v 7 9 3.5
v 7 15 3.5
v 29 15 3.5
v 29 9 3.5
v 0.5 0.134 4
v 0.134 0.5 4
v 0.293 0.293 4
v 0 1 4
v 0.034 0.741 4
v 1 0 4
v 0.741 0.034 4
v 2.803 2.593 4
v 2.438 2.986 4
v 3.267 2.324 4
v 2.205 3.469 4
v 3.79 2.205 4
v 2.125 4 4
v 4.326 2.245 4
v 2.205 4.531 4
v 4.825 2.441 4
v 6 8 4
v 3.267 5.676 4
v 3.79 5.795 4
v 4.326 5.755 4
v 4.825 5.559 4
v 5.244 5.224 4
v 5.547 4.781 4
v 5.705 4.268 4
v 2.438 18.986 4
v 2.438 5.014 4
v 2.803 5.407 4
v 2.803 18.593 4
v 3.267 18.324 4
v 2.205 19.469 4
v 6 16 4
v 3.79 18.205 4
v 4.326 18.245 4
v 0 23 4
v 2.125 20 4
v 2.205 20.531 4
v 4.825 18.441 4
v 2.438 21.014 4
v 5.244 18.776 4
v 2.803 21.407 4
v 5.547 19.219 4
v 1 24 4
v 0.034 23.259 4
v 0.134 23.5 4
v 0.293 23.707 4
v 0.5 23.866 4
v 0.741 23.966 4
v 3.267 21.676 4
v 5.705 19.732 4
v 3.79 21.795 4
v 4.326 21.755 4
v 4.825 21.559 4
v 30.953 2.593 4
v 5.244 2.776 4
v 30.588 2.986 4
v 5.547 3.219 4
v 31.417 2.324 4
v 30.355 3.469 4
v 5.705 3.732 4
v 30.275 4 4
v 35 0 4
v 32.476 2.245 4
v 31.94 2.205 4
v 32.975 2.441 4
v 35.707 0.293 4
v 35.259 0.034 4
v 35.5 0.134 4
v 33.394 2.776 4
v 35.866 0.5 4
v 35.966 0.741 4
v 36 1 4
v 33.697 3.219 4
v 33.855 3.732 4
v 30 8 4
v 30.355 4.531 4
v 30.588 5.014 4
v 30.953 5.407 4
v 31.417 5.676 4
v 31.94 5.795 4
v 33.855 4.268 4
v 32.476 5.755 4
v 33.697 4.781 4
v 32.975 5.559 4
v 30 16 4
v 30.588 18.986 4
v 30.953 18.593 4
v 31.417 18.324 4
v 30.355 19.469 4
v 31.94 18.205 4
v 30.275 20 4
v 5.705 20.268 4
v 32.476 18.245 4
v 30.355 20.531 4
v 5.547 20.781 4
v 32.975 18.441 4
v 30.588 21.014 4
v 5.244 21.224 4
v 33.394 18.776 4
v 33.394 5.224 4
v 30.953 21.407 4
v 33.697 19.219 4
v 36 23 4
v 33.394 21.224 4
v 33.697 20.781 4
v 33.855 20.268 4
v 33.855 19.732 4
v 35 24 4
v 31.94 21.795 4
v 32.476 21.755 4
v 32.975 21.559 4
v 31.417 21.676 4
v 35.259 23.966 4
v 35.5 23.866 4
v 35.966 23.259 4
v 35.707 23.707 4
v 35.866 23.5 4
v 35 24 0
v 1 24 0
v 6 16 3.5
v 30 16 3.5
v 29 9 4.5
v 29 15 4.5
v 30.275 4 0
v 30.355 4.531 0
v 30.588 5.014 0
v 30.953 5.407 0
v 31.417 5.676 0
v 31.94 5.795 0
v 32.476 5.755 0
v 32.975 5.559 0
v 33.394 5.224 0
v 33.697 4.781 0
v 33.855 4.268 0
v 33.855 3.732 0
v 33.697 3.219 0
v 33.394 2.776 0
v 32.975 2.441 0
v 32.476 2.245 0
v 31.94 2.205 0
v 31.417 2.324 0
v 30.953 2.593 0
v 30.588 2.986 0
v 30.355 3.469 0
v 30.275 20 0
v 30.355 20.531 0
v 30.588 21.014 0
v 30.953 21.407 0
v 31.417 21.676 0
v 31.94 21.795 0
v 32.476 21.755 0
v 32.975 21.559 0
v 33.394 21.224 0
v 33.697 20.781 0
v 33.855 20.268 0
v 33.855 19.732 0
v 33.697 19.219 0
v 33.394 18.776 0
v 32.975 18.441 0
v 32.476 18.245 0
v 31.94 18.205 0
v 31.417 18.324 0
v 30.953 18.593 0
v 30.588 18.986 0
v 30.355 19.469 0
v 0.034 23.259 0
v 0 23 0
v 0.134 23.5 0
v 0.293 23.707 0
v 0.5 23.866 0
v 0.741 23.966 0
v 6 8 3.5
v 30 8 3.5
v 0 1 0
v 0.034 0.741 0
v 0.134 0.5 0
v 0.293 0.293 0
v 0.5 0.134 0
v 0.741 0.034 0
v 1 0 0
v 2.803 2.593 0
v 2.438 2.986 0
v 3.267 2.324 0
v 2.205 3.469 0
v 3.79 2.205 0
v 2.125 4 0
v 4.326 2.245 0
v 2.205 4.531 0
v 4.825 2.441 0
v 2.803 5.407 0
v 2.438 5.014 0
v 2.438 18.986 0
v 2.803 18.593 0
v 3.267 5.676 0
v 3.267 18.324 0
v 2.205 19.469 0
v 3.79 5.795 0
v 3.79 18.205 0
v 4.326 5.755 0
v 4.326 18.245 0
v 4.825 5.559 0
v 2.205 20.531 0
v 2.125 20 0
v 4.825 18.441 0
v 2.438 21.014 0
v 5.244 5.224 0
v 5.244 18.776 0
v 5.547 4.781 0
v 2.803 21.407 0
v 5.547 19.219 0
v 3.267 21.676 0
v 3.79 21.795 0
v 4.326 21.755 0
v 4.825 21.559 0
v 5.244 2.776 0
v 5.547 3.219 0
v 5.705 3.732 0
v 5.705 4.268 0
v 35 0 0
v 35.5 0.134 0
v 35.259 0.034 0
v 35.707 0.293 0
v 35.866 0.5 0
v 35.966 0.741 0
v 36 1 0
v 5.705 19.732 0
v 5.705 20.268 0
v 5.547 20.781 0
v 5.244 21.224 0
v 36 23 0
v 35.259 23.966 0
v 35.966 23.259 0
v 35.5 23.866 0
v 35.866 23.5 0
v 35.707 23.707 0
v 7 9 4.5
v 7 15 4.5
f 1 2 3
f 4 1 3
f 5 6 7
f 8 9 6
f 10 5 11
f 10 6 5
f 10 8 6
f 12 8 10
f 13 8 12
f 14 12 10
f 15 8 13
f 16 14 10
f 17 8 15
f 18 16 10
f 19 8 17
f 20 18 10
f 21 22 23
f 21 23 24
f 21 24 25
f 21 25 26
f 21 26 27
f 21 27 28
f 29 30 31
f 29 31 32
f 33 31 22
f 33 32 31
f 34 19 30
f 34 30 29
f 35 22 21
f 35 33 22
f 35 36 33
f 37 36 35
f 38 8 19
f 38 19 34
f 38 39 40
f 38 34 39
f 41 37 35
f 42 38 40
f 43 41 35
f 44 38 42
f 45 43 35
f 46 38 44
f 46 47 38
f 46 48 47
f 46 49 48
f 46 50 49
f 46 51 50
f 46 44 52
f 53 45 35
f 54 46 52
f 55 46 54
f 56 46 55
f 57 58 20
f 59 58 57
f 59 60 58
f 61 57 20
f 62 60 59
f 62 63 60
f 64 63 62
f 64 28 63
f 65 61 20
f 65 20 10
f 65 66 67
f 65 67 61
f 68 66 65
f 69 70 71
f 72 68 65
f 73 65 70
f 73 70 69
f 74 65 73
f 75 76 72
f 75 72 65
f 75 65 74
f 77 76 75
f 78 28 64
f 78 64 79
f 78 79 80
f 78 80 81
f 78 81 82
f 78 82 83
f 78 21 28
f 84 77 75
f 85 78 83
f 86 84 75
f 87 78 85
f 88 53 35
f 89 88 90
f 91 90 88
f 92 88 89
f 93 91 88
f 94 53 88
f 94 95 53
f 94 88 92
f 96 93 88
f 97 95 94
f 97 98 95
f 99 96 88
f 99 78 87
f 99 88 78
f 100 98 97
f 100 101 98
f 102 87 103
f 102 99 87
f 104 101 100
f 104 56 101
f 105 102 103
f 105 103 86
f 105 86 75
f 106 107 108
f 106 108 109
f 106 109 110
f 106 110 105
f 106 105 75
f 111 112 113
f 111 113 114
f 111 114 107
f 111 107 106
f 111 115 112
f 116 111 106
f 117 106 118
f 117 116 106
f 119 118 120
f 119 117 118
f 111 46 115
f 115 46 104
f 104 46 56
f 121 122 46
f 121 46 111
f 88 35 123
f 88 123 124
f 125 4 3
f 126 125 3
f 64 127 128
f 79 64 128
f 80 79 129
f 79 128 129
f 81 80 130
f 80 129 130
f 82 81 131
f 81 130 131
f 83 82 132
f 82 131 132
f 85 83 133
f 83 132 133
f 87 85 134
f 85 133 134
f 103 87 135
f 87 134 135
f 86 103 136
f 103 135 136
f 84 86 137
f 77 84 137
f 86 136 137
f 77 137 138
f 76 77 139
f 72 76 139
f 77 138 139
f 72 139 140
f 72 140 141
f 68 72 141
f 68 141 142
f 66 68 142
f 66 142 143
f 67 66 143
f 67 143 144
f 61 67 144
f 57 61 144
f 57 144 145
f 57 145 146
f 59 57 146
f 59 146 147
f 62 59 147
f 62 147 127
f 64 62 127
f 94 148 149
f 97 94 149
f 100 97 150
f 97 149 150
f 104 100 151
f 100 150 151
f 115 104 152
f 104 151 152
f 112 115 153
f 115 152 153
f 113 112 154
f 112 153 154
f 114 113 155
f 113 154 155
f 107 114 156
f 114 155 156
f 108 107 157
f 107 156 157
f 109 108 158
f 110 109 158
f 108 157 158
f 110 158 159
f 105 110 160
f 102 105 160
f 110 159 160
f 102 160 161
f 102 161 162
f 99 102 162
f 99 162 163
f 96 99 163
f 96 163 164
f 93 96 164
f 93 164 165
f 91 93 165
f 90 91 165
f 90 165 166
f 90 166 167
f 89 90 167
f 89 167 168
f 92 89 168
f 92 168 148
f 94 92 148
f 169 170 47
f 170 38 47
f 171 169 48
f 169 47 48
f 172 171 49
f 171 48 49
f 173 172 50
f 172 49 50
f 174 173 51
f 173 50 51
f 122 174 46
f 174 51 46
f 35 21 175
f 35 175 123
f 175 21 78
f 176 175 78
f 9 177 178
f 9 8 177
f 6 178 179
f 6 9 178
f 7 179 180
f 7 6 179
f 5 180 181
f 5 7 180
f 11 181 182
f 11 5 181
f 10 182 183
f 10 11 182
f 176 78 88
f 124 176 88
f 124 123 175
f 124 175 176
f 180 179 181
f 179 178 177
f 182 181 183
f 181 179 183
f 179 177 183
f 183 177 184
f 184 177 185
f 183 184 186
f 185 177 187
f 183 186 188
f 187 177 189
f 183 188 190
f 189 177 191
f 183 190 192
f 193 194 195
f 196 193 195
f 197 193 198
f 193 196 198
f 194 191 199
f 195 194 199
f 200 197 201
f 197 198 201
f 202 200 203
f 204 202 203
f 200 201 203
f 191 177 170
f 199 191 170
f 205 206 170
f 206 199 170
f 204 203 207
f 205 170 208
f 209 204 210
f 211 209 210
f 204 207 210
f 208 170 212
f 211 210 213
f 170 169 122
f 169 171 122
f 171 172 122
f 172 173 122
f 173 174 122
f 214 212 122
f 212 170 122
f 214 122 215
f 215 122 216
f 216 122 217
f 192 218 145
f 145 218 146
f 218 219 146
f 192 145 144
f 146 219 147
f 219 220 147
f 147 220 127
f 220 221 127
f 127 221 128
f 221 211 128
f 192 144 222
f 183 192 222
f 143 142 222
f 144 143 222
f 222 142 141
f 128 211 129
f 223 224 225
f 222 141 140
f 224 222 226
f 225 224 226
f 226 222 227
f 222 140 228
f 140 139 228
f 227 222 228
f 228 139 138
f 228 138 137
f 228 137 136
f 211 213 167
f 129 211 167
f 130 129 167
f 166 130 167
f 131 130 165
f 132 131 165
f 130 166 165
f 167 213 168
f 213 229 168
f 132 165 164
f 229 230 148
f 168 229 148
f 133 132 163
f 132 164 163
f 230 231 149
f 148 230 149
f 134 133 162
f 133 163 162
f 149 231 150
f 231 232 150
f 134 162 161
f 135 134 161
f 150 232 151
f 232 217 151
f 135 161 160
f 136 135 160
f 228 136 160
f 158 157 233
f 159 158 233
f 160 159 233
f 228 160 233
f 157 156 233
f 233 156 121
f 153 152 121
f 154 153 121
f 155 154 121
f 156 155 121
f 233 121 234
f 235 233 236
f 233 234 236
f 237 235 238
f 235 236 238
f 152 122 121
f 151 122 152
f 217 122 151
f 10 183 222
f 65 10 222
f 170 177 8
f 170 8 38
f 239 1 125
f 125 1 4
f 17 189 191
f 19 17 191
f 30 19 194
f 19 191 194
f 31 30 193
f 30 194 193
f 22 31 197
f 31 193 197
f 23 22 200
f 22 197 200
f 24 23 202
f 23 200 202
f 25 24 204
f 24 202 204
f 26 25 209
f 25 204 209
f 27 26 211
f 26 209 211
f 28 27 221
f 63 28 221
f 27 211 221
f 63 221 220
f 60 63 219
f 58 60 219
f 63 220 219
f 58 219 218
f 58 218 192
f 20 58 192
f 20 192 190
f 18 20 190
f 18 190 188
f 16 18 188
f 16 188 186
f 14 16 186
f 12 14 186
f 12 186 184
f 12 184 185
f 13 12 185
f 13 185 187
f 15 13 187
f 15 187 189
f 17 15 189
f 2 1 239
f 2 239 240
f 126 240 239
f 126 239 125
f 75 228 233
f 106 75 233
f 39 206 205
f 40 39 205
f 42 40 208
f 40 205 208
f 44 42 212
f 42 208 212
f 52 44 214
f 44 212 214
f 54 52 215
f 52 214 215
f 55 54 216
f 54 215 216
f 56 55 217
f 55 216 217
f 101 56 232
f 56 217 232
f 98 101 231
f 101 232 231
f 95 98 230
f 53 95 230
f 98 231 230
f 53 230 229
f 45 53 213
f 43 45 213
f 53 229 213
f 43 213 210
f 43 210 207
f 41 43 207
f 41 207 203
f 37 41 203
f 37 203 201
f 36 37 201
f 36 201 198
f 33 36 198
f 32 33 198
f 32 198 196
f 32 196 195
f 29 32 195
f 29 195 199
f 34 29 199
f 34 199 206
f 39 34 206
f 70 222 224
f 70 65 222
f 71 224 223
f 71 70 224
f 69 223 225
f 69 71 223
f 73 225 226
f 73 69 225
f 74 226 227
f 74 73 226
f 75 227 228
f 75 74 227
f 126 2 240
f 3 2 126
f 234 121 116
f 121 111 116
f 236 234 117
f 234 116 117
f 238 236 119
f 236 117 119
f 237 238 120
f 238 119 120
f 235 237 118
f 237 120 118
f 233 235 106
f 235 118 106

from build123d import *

# Parameters (mm, degrees)
SKETCH1_W                = 36
SKETCH1_H                = 24
BOSS_EXTRUDE1_DEPTH      = 4
M3_CLEARANCE_HOLE1_D     = 3.6
M3_CLEARANCE_HOLE1_DEPTH = 16
M3_CLEARANCE_HOLE1_TIP   = 1.081549114
FILLET1_R                = 1
SKETCH4_W                = 24
SKETCH4_H                = 8
CUT_EXTRUDE1_DEPTH       = 0.5
SKETCH5_W                = 22
SKETCH5_H                = 6
BOSS_EXTRUDE2_DEPTH      = 1


with BuildPart() as part:
    # Sketch1 → Boss-Extrude1 (new body)
    with BuildSketch(Plane.XY):
        with Locations((18, 12)):
            Rectangle(SKETCH1_W, SKETCH1_H)
    extrude(amount=BOSS_EXTRUDE1_DEPTH)

    # M3 Clearance Hole1
    with Locations(Plane.XY.offset(4)):
        with Locations((3.925, 20), (32.075, 20), (32.075, 4), (3.925, 4)):
            Hole(M3_CLEARANCE_HOLE1_D / 2, depth=M3_CLEARANCE_HOLE1_DEPTH)
            with Locations((0, 0, -(M3_CLEARANCE_HOLE1_DEPTH + M3_CLEARANCE_HOLE1_TIP / 2))):  # 118° drill point
                Cone(0, M3_CLEARANCE_HOLE1_D / 2, M3_CLEARANCE_HOLE1_TIP, mode=Mode.SUBTRACT)

    # Fillet1
    fillet1_edges = [part.edges().sort_by_distance(p)[0] for p in [
        (0, 24, 2),
        (36, 24, 2),
        (36, 0, 2),
        (0, 0, 2),
    ]]
    fillet(fillet1_edges, radius=FILLET1_R)

    # Sketch4 → Cut-Extrude1 (cut)
    with BuildSketch(Plane.XY.offset(4)):
        with Locations((18, 12)):
            Rectangle(SKETCH4_W, SKETCH4_H)
    extrude(amount=-CUT_EXTRUDE1_DEPTH, mode=Mode.SUBTRACT)


with BuildPart() as body_2:
    # Sketch5 → Boss-Extrude2 (new body)
    with BuildSketch(Plane.XY.offset(3.5)):
        with Locations((18, 12)):
            Rectangle(SKETCH5_W, SKETCH5_H)
    extrude(amount=BOSS_EXTRUDE2_DEPTH)


solid = Compound([part.part, body_2.part])
